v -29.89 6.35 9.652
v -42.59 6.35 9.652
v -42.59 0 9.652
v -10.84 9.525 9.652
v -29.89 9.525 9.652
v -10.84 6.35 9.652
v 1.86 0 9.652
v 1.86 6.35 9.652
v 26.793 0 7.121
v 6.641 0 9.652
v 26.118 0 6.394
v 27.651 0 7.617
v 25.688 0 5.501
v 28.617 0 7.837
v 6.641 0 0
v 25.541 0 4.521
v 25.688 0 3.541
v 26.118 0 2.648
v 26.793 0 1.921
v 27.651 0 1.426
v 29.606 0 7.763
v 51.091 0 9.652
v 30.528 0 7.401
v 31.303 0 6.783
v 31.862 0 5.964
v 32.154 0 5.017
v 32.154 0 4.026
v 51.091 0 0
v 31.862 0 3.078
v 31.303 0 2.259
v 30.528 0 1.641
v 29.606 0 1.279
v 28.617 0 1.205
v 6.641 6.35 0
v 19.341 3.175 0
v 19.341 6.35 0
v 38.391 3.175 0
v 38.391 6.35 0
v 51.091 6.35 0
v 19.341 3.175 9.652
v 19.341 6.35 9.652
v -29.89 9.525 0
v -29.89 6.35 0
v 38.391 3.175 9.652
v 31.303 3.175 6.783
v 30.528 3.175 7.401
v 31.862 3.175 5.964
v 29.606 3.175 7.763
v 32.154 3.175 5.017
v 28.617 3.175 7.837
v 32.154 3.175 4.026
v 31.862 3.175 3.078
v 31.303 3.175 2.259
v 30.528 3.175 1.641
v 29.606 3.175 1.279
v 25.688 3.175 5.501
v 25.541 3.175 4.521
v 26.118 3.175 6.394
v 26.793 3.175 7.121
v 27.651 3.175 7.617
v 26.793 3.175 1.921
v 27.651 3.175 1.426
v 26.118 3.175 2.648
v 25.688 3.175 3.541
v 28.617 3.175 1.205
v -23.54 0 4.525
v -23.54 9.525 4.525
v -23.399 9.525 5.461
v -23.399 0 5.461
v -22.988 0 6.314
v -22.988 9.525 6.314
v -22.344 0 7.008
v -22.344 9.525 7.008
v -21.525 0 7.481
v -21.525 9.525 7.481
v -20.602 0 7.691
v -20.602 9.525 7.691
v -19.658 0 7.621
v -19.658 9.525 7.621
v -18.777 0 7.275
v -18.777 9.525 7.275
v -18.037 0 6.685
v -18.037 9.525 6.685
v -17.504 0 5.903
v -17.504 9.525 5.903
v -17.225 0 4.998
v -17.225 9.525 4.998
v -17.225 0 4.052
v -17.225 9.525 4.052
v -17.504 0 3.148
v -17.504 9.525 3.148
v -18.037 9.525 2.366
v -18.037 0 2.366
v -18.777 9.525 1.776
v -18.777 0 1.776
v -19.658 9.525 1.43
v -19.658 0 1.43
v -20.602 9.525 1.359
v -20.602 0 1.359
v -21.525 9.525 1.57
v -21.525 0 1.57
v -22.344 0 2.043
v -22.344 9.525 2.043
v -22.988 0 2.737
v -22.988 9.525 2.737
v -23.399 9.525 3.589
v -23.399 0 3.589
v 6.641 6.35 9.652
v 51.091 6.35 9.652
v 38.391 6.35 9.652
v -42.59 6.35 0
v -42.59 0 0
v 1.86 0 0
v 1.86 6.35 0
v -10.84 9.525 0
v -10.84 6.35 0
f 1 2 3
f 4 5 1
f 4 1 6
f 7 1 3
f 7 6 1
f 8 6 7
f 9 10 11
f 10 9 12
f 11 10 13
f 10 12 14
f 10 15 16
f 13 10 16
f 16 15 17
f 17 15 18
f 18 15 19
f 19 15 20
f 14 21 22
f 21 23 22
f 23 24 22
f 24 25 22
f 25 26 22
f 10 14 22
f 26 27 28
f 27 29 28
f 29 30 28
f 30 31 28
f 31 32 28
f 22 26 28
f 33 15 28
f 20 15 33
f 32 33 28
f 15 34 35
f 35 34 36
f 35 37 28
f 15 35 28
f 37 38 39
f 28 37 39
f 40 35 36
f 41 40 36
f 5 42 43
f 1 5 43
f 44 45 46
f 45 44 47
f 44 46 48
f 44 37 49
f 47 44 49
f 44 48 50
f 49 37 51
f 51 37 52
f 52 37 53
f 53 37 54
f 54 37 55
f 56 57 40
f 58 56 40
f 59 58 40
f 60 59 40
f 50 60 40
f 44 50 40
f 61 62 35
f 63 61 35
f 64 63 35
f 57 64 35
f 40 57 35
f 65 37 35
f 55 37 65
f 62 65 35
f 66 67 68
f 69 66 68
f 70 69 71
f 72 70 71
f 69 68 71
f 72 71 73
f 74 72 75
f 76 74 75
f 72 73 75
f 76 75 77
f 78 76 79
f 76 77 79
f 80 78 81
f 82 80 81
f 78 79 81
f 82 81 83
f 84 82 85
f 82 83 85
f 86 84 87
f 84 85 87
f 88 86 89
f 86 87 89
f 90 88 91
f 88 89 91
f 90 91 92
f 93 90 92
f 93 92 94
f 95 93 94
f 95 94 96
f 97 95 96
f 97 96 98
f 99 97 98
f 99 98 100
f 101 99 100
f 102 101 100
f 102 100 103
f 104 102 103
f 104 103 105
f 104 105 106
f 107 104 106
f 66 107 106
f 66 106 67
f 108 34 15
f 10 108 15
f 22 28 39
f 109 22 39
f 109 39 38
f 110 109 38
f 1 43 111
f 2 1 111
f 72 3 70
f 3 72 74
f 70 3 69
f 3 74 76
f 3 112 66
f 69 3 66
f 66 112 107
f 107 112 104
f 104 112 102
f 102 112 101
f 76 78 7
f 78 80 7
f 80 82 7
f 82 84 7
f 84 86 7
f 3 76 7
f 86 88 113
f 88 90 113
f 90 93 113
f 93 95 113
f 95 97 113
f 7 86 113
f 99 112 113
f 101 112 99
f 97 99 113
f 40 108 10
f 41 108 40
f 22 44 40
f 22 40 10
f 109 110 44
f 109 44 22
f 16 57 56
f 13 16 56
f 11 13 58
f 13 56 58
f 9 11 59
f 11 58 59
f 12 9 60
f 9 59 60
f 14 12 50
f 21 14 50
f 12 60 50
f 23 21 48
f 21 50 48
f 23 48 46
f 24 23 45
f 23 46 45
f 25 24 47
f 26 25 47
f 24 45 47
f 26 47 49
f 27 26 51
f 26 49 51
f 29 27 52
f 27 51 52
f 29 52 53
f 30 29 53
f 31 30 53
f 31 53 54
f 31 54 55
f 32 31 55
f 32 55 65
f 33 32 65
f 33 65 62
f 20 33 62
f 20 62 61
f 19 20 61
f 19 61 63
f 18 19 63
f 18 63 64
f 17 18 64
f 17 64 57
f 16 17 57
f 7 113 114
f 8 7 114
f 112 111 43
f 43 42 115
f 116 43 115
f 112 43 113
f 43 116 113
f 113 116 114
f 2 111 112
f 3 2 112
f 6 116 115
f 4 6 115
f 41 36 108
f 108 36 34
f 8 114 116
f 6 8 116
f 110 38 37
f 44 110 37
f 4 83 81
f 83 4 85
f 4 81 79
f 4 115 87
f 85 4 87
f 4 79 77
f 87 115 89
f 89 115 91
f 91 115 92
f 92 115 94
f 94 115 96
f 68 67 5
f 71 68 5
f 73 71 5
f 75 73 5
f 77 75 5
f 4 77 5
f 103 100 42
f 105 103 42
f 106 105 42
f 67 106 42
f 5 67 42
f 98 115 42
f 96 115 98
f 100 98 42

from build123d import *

# Parameters (mm, degrees)
F1_DEPTH = 9.652
F2_DEPTH = 9.652
F3_R     = 3.175
F4_DEPTH = 25.4
F5_R     = 3.325305
F6_DEPTH = 25.4


with BuildPart() as f1:
    # F0 (on Top) → F1 (new body)
    with BuildSketch(Plane.XY):
        Polygon((19.340847, 6.35), (6.640847, 6.35), (6.640847, 0), (51.090847, 0), (51.090847, 6.35), (38.390847, 6.35), (38.390847, 3.175), (19.340847, 3.175), align=None)
    extrude(amount=F1_DEPTH)

    # F0 (on Top) → F2 (join)
    with BuildSketch(Plane.XY):
        Polygon((19.340847, 6.35), (6.640847, 6.35), (6.640847, 0), (51.090847, 0), (51.090847, 6.35), (38.390847, 6.35), (38.390847, 3.175), (19.340847, 3.175), align=None)
        Polygon((-29.889638, 6.35), (-42.589638, 6.35), (-42.589638, 0), (1.860362, 0), (1.860362, 6.35), (-10.839638, 6.35), (-10.839638, 9.525), (-29.889638, 9.525), align=None)
    extrude(amount=F2_DEPTH)

    # F3 (on face) → F4 (cut)
    with BuildSketch(Plane(origin=(0, 9.525, 0), x_dir=(-1, 0, 0), z_dir=(0, 1, 0))):
        with Locations((20.364638, 4.525273)):
            Circle(F3_R)
    extrude(amount=-F4_DEPTH, mode=Mode.SUBTRACT)

    # F5 (on face) → F6 (cut)
    with BuildSketch(Plane(origin=(0, 3.175, 0), x_dir=(-1, 0, 0), z_dir=(0, 1, 0))):
        with Locations((-28.865847, 4.5212)):
            Circle(F5_R)
    extrude(amount=-F6_DEPTH, mode=Mode.SUBTRACT)


solid = f1.part
